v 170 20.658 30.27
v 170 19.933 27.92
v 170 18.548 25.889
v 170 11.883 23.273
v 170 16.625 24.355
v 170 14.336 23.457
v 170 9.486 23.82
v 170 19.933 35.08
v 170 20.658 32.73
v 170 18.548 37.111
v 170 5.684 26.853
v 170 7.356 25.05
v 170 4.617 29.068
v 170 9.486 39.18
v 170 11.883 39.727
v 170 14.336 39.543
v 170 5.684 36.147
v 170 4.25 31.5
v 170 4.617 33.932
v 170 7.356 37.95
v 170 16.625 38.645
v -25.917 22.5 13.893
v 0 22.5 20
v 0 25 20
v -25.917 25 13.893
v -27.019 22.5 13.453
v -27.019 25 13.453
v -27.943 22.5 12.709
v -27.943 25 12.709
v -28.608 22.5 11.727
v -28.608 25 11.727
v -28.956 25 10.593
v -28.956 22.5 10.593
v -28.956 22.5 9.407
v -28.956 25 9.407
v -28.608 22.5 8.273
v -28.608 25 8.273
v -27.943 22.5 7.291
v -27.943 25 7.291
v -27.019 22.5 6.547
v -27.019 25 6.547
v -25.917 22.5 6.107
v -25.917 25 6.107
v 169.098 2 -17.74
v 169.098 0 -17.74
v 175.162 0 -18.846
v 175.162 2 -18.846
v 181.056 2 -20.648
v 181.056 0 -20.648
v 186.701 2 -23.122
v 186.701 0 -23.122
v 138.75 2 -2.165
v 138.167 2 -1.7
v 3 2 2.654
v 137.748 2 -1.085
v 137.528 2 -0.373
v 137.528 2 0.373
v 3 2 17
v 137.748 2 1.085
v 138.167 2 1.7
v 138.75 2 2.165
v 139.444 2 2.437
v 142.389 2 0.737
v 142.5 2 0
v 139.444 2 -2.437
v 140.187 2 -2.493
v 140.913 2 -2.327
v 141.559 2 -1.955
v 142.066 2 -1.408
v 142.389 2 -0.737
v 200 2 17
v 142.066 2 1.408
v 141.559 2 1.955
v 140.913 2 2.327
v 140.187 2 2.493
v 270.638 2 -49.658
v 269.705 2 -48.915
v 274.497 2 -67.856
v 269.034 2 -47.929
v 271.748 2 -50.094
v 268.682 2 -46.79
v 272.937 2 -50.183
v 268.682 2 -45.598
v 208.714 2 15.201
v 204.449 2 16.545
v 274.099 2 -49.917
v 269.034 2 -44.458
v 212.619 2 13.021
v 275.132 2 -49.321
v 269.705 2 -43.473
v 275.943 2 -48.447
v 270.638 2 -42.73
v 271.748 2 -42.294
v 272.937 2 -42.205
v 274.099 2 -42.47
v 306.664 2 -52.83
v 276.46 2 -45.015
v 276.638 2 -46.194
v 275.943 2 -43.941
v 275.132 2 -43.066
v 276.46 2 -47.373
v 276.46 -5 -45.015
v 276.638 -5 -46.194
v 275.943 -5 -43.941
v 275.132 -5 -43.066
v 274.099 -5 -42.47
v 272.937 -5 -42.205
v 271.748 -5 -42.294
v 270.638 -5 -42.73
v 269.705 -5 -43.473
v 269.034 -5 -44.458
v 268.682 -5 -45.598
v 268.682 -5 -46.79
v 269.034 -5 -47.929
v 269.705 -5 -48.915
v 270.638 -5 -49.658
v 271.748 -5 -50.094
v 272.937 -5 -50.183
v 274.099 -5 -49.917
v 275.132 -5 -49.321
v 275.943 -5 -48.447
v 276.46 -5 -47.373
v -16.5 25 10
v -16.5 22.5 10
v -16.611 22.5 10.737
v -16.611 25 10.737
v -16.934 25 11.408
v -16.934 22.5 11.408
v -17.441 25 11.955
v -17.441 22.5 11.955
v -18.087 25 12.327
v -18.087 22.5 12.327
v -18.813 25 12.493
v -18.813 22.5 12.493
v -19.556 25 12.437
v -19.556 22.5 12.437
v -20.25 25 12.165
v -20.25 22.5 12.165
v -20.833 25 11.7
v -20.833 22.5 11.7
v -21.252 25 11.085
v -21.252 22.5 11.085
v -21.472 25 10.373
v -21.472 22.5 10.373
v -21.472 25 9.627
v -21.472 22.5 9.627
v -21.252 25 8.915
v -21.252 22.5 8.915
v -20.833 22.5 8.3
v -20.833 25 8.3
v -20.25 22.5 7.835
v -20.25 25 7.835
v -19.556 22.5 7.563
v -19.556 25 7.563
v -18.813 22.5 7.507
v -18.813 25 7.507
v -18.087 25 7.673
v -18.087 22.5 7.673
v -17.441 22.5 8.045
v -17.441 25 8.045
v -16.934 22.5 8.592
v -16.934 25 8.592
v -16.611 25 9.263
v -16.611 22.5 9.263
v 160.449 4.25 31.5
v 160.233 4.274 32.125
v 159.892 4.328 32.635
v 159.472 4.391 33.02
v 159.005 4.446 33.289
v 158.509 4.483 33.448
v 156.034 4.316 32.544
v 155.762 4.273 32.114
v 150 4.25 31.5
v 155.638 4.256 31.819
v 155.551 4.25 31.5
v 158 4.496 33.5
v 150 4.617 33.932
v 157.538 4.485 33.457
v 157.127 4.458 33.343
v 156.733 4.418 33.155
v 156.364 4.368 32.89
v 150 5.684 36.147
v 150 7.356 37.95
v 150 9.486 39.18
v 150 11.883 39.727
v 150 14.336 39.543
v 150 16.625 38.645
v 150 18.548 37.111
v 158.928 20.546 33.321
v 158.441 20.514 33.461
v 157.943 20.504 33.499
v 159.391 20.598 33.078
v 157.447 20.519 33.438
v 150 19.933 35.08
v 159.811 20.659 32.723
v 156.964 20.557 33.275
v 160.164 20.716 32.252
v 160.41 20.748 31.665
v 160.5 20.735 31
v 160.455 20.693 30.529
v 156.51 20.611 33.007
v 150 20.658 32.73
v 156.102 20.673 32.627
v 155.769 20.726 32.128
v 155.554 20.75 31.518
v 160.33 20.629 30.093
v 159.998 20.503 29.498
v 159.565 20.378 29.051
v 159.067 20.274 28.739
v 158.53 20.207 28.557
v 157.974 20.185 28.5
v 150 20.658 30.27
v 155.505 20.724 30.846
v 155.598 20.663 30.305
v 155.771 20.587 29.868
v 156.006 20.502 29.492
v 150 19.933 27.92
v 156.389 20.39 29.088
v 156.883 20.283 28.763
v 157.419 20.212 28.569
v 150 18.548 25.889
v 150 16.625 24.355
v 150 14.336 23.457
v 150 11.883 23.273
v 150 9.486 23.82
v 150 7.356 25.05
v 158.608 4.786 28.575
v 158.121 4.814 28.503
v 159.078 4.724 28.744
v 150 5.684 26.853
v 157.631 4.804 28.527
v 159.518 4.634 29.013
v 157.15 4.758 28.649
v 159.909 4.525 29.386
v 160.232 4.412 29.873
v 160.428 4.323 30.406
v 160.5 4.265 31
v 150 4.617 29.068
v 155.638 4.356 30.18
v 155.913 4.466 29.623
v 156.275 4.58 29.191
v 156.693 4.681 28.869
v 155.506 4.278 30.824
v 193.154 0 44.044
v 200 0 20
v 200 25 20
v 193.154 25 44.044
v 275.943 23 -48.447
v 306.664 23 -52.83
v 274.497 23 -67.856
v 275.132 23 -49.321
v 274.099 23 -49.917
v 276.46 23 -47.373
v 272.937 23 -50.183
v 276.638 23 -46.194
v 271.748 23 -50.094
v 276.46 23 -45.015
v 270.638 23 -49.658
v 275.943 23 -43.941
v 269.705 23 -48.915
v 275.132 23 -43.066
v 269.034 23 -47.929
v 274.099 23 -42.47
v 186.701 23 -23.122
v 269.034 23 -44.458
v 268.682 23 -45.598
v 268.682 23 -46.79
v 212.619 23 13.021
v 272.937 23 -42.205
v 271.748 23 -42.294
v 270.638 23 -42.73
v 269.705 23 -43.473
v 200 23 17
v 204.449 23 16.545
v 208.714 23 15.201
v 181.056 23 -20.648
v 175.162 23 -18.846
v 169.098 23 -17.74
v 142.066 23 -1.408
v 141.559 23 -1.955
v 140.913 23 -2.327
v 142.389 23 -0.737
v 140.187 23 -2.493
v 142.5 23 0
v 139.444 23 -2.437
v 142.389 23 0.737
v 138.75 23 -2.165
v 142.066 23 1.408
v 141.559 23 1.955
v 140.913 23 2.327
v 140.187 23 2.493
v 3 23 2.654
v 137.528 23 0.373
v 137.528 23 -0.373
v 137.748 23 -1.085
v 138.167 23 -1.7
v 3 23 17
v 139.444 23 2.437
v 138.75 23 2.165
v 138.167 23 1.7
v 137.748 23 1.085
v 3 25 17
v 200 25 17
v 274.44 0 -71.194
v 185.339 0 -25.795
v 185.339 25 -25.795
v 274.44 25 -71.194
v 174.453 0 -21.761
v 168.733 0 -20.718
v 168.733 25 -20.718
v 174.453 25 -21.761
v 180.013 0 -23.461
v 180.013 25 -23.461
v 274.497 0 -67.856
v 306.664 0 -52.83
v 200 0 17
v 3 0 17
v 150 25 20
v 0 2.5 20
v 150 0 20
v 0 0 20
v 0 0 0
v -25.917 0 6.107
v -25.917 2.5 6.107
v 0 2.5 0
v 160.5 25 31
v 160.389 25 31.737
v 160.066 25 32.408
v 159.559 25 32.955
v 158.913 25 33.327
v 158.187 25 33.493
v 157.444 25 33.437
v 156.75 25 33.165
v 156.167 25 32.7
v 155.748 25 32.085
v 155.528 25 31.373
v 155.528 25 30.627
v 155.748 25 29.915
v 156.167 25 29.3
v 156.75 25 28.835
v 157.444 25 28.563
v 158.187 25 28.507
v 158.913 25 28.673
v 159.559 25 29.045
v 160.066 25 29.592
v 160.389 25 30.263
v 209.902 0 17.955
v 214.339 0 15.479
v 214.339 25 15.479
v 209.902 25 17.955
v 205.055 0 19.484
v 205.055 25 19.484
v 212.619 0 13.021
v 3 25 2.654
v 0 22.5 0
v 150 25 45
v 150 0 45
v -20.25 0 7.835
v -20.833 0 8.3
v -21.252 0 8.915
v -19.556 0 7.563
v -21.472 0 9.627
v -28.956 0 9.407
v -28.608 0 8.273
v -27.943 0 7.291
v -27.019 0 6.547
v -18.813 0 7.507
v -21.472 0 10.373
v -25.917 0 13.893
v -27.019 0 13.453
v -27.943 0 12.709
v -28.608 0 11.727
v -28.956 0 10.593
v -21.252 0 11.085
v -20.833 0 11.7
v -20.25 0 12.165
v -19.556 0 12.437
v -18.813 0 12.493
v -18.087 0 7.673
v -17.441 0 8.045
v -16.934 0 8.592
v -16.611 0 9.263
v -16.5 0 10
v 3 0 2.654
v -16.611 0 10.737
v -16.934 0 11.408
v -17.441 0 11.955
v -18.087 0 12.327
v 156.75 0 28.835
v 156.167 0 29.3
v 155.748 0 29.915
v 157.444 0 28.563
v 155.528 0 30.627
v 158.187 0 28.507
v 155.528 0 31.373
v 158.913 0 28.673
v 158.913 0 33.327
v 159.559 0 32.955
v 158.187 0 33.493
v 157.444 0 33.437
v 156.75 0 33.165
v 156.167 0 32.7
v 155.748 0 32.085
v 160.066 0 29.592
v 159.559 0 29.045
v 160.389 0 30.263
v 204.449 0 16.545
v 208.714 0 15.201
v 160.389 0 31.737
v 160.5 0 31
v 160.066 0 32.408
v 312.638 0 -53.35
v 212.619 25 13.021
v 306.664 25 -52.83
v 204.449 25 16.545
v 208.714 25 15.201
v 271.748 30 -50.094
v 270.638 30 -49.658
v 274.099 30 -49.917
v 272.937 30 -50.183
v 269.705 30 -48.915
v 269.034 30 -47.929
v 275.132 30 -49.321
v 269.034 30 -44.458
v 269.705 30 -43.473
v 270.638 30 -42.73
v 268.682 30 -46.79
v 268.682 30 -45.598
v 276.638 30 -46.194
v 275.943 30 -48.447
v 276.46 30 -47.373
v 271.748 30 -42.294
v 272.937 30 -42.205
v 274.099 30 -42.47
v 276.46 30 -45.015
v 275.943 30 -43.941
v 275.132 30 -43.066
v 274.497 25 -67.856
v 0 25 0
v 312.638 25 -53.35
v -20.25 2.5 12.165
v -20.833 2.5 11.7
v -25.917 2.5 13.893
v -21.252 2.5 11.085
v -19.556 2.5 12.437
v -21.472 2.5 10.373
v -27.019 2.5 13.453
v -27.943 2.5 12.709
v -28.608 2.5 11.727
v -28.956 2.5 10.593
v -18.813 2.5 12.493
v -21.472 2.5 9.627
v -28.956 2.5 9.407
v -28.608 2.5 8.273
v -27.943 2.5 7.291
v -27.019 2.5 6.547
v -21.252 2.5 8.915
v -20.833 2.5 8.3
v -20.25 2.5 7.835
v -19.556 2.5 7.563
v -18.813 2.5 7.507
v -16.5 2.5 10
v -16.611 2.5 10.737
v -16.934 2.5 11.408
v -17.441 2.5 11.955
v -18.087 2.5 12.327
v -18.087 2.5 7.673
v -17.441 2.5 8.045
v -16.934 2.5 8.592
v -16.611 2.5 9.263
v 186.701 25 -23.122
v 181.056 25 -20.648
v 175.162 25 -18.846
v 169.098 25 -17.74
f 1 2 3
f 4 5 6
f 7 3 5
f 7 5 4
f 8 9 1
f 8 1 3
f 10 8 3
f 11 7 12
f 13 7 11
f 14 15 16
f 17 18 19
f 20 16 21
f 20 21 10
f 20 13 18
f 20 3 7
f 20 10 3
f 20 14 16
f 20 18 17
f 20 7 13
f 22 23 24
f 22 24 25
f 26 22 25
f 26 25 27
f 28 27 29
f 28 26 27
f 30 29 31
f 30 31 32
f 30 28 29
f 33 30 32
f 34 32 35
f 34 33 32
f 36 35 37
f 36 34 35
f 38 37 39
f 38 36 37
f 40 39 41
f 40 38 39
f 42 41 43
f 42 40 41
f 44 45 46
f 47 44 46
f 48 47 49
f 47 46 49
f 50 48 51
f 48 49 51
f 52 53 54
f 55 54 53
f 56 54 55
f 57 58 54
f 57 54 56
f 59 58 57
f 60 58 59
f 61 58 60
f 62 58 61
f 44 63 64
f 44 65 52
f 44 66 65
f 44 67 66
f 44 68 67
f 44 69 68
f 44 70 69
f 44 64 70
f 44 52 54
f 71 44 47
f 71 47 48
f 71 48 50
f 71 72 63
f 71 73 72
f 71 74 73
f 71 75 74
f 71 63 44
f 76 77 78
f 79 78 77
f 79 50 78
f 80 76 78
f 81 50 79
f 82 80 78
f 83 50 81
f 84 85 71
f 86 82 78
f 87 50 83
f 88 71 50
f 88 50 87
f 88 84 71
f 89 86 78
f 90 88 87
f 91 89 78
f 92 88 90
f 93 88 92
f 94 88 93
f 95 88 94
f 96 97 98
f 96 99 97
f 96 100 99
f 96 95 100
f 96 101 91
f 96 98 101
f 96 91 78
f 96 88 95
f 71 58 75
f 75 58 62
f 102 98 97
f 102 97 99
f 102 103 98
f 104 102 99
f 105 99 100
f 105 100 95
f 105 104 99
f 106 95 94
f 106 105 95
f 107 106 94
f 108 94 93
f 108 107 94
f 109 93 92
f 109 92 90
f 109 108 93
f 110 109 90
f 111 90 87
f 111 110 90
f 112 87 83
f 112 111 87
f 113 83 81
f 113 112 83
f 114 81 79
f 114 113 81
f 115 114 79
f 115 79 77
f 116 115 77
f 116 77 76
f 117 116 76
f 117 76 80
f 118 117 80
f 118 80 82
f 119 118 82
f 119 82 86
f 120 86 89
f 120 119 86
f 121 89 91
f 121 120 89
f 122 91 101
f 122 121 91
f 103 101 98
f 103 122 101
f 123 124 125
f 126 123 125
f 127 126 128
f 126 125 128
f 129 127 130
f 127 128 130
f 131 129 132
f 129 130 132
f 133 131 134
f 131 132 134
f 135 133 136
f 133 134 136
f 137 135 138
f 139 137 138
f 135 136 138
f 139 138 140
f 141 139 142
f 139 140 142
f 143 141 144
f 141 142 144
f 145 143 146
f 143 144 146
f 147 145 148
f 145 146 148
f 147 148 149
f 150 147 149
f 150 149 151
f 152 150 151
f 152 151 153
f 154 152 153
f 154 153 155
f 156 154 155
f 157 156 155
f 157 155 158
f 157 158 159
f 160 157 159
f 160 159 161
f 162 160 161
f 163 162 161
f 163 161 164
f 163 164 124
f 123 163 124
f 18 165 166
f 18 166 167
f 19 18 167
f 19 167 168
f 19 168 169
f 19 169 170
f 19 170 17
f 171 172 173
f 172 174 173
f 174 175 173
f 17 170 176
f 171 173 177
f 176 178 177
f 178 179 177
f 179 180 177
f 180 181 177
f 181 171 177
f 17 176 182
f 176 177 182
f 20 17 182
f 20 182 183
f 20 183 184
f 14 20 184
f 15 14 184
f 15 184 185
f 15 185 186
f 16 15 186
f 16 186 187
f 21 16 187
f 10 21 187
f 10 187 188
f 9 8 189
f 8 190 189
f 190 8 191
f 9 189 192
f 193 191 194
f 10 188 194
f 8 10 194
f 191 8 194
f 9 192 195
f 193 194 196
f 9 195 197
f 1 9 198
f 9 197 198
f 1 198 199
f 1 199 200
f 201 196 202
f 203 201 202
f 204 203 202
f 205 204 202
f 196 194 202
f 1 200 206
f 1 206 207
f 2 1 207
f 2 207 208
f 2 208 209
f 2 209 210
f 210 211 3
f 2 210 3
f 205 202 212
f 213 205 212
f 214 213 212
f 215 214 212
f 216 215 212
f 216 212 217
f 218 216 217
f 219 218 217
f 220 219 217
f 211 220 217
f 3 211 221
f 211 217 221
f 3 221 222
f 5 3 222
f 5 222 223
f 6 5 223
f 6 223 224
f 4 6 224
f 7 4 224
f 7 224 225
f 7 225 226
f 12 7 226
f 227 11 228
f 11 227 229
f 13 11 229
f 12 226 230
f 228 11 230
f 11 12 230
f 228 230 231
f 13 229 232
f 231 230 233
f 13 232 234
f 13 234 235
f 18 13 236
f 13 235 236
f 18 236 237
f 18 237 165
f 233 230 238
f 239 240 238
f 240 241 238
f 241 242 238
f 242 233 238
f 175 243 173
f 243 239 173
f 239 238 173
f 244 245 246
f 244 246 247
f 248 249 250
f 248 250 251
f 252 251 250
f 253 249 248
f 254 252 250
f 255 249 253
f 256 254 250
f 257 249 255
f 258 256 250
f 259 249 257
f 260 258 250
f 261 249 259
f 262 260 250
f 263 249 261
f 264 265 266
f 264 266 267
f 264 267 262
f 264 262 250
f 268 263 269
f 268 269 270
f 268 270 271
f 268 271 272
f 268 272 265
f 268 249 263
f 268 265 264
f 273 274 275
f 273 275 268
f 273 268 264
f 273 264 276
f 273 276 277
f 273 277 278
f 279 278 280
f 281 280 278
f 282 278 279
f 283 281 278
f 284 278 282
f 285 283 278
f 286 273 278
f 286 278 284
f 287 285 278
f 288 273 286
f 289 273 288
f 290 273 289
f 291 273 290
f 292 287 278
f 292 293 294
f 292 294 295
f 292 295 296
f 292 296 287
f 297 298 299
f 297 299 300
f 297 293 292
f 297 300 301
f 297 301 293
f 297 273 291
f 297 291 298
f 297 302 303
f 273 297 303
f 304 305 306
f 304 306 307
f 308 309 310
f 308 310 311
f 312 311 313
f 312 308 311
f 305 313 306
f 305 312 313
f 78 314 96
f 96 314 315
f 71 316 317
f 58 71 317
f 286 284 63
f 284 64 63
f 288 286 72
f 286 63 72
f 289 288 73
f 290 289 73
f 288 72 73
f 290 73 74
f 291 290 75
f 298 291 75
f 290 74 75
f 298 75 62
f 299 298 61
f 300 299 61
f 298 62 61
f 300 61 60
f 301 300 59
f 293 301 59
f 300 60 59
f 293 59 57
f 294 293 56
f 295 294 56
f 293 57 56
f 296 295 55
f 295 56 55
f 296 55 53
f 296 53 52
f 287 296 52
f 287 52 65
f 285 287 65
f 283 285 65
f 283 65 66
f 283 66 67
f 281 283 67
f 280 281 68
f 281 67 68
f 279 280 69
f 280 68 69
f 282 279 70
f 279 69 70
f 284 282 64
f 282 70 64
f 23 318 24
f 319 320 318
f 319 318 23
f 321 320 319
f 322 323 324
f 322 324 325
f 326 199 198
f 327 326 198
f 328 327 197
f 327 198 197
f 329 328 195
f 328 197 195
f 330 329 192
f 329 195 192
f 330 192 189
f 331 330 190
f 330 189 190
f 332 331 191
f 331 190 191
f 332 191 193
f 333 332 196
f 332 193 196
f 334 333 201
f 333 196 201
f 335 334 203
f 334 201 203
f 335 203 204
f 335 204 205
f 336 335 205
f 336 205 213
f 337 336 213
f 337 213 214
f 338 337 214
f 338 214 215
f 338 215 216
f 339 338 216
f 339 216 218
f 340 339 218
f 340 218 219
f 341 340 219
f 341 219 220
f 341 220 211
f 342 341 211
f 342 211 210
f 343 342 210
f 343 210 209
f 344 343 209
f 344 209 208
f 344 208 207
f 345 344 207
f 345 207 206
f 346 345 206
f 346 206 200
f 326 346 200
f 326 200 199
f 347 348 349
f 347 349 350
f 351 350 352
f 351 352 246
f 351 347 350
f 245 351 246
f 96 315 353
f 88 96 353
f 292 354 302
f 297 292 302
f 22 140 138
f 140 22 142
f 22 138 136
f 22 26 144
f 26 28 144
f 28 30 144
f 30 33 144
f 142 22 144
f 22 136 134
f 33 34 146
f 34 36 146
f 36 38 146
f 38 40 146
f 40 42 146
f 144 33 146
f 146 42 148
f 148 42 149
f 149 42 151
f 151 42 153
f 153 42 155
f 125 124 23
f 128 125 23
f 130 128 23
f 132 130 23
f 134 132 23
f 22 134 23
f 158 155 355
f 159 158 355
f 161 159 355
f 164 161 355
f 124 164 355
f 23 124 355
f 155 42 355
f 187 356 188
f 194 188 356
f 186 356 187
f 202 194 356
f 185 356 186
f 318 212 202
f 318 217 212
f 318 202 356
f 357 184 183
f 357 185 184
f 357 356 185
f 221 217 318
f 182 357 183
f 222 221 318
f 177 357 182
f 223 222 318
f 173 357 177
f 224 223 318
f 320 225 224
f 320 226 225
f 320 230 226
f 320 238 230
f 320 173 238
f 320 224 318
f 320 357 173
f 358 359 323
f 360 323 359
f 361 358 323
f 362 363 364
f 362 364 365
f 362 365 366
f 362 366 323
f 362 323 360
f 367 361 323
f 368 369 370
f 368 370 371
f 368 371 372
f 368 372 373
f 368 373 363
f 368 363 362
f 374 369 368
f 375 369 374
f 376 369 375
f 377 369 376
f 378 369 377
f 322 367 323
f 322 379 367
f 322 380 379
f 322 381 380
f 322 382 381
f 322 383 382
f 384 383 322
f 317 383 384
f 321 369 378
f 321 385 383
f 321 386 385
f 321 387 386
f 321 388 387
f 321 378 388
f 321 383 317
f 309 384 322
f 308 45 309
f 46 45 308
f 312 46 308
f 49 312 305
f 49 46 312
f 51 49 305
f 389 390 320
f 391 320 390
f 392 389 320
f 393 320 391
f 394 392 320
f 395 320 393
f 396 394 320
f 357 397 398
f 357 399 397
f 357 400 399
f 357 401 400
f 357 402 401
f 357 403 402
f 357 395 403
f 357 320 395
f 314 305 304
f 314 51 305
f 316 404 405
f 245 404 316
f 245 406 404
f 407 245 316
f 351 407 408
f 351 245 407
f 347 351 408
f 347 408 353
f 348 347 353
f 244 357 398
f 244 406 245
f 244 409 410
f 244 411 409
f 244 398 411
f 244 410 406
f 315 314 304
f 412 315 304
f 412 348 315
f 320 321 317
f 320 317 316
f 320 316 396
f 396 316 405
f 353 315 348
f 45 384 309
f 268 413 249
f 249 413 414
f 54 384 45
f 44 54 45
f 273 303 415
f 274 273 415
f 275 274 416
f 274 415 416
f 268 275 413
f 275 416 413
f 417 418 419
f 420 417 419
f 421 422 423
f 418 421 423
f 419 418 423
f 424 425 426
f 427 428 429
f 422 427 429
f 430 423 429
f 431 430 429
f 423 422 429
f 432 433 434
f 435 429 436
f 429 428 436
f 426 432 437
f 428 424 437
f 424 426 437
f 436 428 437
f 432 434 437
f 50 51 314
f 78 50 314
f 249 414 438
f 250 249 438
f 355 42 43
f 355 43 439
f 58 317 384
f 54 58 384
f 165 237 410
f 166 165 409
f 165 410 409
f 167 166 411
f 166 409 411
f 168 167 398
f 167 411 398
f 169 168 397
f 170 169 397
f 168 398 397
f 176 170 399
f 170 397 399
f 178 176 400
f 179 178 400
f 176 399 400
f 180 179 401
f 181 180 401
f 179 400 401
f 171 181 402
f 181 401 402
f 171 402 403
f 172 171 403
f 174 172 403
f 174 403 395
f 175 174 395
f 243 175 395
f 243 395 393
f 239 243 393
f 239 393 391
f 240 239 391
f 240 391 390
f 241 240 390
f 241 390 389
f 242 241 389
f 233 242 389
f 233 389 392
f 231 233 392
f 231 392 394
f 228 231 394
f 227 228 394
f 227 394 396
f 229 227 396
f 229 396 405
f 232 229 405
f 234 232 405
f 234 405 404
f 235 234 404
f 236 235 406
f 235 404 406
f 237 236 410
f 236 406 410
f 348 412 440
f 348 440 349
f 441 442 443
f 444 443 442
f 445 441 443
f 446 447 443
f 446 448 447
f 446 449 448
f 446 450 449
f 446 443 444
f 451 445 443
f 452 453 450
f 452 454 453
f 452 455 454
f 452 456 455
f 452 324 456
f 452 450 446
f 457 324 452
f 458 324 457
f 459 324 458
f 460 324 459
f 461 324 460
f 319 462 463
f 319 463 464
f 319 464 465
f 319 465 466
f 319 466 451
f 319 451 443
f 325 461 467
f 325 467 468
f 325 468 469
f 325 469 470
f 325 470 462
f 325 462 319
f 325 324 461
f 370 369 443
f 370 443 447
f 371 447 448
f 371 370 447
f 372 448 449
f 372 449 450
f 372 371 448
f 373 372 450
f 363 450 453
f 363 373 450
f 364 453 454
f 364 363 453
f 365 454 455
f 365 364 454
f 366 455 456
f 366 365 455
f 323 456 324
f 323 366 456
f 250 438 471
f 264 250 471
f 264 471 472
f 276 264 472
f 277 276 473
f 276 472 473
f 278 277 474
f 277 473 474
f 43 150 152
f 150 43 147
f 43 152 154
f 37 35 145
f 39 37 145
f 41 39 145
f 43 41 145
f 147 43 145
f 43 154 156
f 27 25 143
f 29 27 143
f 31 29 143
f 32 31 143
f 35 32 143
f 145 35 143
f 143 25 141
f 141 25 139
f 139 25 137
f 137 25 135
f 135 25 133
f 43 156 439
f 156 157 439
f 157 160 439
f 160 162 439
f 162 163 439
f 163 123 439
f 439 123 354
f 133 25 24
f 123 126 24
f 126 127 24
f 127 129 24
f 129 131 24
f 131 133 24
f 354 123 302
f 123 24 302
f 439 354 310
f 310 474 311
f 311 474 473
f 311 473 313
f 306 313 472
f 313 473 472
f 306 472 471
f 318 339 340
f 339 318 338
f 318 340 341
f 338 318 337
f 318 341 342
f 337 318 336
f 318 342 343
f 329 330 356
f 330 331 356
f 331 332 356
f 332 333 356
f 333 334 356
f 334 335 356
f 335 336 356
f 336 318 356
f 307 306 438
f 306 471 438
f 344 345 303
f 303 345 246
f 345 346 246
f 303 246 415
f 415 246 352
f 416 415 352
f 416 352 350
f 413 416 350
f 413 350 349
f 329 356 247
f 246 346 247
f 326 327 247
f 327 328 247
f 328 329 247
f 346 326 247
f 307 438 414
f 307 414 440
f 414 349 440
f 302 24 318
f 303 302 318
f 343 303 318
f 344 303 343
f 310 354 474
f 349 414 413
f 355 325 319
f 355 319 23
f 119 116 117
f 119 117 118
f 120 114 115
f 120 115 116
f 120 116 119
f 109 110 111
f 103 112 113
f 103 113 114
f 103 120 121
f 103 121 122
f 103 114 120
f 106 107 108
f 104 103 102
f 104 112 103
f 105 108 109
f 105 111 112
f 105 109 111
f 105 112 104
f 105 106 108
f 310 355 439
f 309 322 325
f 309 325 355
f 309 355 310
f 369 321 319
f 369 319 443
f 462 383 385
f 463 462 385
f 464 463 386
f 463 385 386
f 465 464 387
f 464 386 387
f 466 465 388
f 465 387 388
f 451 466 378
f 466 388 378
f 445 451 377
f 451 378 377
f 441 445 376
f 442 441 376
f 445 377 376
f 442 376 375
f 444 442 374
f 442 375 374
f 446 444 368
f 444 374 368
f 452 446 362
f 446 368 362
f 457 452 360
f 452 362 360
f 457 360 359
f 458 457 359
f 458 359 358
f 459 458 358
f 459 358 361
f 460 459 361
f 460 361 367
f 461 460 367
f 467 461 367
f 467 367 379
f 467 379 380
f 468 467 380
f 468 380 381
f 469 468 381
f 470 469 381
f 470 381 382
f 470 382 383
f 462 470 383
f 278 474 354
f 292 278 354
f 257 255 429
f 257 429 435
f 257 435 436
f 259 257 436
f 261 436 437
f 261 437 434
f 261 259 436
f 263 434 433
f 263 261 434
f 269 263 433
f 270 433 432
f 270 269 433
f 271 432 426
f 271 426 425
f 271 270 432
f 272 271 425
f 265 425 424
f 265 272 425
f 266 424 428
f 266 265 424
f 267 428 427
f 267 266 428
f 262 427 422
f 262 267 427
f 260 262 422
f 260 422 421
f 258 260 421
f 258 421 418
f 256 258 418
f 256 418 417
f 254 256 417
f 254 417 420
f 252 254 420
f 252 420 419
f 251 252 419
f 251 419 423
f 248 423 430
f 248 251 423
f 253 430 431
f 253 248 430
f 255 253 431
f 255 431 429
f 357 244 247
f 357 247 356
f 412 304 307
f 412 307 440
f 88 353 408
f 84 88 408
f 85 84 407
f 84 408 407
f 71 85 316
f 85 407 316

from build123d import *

# Parameters (mm, degrees)
F1_DEPTH  = 25
F3_DEPTH  = 2
F5_DEPTH  = 2
F6_DEPTH  = 25
F7_W      = 50
F7_H      = 20
F8_DEPTH  = 20.001
F9_R      = 2.5
F10_DEPTH = 25.001
F12_DEPTH = 25
F14_R     = 8.25
F15_DEPTH = 20
F16_R     = 2.5
F17_DEPTH = 25
F18_R     = 2.5
F19_DEPTH = 25
F21_R     = 4
F22_DEPTH = 17.5
F23_R     = 2.5
F24_DEPTH = 12.5


with BuildPart() as f1:
    # F0 (on Front) → F1 (new body)
    with BuildSketch(Plane.XZ):
        with BuildLine():
            Line((200, 20), (0, 20))
            Line((0, 20), (0, 0))
            Line((0, 0), (168.732845779, -20.7177883789))
            ThreePointArc((168.732845779, -20.7177883789), (177.2579638449, -22.5298581628), (185.3389035957, -25.7947697515))
            Line((185.3389035957, -25.7947697515), (274.4395560146, -71.1938197255))
            Line((274.4395560146, -71.1938197255), (312.6376562235, -53.3503712549))
            Line((312.6376562235, -53.3503712549), (214.3394109088, 15.4788011072))
            ThreePointArc((214.3394109088, 15.4788011072), (207.5176449876, 18.8429237687), (200, 20))
        make_face()
    extrude(amount=-F1_DEPTH)

    # F2 (on face) → F3 (cut)
    with BuildSketch(Plane.XZ):
        with BuildLine():
            ThreePointArc((169.0984538092, -17.740149924), (178.1350789591, -19.6609438949), (186.700875095, -23.121750179))
            Line((186.700875095, -23.121750179), (274.4966924755, -67.8559534935))
            Line((274.4966924755, -67.8559534935), (306.6638017347, -52.829757076))
            Line((306.6638017347, -52.829757076), (212.6186815997, 13.0213449744))
            ThreePointArc((212.6186815997, 13.0213449744), (206.6155275891, 15.9817729165), (200, 17))
            Line((200, 17), (3, 17))
            Line((3, 17), (3, 2.6541757937))
            Line((3, 2.6541757937), (169.0984538092, -17.740149924))
        make_face()
    extrude(amount=-F3_DEPTH, mode=Mode.SUBTRACT)

    # F4 (on face) → F5 (cut)
    with BuildSketch(Plane(origin=(0, 25, 0), x_dir=(-1, 0, 0), z_dir=(0, 1, 0))):
        with BuildLine():
            ThreePointArc((-200, 17), (-206.6155275891, 15.9817729165), (-212.6186815997, 13.0213449744))
            Line((-212.6186815997, 13.0213449744), (-306.6638017347, -52.829757076))
            Line((-306.6638017347, -52.829757076), (-274.4966924755, -67.8559534935))
            Line((-274.4966924755, -67.8559534935), (-186.700875095, -23.121750179))
            ThreePointArc((-186.700875095, -23.121750179), (-178.1350789591, -19.6609438949), (-169.0984538092, -17.740149924))
            Line((-169.0984538092, -17.740149924), (-3, 2.6541757937))
            Line((-3, 2.6541757937), (-3, 17))
            Line((-3, 17), (-200, 17))
        make_face()
    extrude(amount=-F5_DEPTH, mode=Mode.SUBTRACT)

    # F0 (on Front) → F6 (join)
    with BuildSketch(Plane.XZ):
        with BuildLine():
            Line((0, 0), (0, 20))
            Line((0, 20), (-25.9173546986, 13.8933867464))
            ThreePointArc((-25.9173546986, 13.8933867464), (-29, 10), (-25.9173546986, 6.1066132536))
            Line((-25.9173546986, 6.1066132536), (0, 0))
        make_face()
    extrude(amount=-F6_DEPTH)

    # F7 (on Top) → F8 (cut, through all)
    with BuildSketch(Plane.XY):
        with Locations((-25, 12.5)):
            Rectangle(F7_W, F7_H)
    extrude(amount=F8_DEPTH, mode=Mode.SUBTRACT)

    # F9 (on Front) → F10 (cut, through all)
    with BuildSketch(Plane.XZ):
        with Locations((-19, 10)):
            Circle(F9_R)
    extrude(amount=-F10_DEPTH, mode=Mode.SUBTRACT)

    # F11 (on Front) → F12 (join)
    with BuildSketch(Plane.XZ):
        Polygon((150, 45), (150, 20), (200, 20), (193.1540331912, 44.0443909977), align=None)
    extrude(amount=-F12_DEPTH)

    # F14 (on face) → F15 (cut)
    with BuildSketch(Plane(origin=(150, 0, 0), x_dir=(0, -1, 0), z_dir=(-1, 0, 0))):
        with Locations((-12.5, 31.5)):
            Circle(F14_R)
    extrude(amount=-F15_DEPTH, mode=Mode.SUBTRACT)

    # F16 (on face) → F17 (cut)
    with BuildSketch(Plane.XZ):
        with Locations((144.0621566447, 31.638596327)):
            Circle(F16_R)
    extrude(amount=-F17_DEPTH, mode=Mode.SUBTRACT)

    # F18 (on face) → F19 (cut)
    with BuildSketch(Plane.XZ):
        with Locations((158, 31)):
            Circle(F18_R)
    extrude(amount=-F19_DEPTH, mode=Mode.SUBTRACT)

    # F21 (on offset) → F22 (join, symmetric)
    with BuildSketch(Plane.XZ.offset(-12.5)):
        with Locations((272.6376562235, -46.1938197255)):
            Circle(F21_R)
    extrude(amount=F22_DEPTH, both=True)

    # F23 (on offset) → F24 (cut, symmetric)
    with BuildSketch(Plane.XZ.offset(-12.5)):
        with Locations((140, 0)):
            Circle(F23_R)
    extrude(amount=F24_DEPTH, both=True, mode=Mode.SUBTRACT)


solid = f1.part
